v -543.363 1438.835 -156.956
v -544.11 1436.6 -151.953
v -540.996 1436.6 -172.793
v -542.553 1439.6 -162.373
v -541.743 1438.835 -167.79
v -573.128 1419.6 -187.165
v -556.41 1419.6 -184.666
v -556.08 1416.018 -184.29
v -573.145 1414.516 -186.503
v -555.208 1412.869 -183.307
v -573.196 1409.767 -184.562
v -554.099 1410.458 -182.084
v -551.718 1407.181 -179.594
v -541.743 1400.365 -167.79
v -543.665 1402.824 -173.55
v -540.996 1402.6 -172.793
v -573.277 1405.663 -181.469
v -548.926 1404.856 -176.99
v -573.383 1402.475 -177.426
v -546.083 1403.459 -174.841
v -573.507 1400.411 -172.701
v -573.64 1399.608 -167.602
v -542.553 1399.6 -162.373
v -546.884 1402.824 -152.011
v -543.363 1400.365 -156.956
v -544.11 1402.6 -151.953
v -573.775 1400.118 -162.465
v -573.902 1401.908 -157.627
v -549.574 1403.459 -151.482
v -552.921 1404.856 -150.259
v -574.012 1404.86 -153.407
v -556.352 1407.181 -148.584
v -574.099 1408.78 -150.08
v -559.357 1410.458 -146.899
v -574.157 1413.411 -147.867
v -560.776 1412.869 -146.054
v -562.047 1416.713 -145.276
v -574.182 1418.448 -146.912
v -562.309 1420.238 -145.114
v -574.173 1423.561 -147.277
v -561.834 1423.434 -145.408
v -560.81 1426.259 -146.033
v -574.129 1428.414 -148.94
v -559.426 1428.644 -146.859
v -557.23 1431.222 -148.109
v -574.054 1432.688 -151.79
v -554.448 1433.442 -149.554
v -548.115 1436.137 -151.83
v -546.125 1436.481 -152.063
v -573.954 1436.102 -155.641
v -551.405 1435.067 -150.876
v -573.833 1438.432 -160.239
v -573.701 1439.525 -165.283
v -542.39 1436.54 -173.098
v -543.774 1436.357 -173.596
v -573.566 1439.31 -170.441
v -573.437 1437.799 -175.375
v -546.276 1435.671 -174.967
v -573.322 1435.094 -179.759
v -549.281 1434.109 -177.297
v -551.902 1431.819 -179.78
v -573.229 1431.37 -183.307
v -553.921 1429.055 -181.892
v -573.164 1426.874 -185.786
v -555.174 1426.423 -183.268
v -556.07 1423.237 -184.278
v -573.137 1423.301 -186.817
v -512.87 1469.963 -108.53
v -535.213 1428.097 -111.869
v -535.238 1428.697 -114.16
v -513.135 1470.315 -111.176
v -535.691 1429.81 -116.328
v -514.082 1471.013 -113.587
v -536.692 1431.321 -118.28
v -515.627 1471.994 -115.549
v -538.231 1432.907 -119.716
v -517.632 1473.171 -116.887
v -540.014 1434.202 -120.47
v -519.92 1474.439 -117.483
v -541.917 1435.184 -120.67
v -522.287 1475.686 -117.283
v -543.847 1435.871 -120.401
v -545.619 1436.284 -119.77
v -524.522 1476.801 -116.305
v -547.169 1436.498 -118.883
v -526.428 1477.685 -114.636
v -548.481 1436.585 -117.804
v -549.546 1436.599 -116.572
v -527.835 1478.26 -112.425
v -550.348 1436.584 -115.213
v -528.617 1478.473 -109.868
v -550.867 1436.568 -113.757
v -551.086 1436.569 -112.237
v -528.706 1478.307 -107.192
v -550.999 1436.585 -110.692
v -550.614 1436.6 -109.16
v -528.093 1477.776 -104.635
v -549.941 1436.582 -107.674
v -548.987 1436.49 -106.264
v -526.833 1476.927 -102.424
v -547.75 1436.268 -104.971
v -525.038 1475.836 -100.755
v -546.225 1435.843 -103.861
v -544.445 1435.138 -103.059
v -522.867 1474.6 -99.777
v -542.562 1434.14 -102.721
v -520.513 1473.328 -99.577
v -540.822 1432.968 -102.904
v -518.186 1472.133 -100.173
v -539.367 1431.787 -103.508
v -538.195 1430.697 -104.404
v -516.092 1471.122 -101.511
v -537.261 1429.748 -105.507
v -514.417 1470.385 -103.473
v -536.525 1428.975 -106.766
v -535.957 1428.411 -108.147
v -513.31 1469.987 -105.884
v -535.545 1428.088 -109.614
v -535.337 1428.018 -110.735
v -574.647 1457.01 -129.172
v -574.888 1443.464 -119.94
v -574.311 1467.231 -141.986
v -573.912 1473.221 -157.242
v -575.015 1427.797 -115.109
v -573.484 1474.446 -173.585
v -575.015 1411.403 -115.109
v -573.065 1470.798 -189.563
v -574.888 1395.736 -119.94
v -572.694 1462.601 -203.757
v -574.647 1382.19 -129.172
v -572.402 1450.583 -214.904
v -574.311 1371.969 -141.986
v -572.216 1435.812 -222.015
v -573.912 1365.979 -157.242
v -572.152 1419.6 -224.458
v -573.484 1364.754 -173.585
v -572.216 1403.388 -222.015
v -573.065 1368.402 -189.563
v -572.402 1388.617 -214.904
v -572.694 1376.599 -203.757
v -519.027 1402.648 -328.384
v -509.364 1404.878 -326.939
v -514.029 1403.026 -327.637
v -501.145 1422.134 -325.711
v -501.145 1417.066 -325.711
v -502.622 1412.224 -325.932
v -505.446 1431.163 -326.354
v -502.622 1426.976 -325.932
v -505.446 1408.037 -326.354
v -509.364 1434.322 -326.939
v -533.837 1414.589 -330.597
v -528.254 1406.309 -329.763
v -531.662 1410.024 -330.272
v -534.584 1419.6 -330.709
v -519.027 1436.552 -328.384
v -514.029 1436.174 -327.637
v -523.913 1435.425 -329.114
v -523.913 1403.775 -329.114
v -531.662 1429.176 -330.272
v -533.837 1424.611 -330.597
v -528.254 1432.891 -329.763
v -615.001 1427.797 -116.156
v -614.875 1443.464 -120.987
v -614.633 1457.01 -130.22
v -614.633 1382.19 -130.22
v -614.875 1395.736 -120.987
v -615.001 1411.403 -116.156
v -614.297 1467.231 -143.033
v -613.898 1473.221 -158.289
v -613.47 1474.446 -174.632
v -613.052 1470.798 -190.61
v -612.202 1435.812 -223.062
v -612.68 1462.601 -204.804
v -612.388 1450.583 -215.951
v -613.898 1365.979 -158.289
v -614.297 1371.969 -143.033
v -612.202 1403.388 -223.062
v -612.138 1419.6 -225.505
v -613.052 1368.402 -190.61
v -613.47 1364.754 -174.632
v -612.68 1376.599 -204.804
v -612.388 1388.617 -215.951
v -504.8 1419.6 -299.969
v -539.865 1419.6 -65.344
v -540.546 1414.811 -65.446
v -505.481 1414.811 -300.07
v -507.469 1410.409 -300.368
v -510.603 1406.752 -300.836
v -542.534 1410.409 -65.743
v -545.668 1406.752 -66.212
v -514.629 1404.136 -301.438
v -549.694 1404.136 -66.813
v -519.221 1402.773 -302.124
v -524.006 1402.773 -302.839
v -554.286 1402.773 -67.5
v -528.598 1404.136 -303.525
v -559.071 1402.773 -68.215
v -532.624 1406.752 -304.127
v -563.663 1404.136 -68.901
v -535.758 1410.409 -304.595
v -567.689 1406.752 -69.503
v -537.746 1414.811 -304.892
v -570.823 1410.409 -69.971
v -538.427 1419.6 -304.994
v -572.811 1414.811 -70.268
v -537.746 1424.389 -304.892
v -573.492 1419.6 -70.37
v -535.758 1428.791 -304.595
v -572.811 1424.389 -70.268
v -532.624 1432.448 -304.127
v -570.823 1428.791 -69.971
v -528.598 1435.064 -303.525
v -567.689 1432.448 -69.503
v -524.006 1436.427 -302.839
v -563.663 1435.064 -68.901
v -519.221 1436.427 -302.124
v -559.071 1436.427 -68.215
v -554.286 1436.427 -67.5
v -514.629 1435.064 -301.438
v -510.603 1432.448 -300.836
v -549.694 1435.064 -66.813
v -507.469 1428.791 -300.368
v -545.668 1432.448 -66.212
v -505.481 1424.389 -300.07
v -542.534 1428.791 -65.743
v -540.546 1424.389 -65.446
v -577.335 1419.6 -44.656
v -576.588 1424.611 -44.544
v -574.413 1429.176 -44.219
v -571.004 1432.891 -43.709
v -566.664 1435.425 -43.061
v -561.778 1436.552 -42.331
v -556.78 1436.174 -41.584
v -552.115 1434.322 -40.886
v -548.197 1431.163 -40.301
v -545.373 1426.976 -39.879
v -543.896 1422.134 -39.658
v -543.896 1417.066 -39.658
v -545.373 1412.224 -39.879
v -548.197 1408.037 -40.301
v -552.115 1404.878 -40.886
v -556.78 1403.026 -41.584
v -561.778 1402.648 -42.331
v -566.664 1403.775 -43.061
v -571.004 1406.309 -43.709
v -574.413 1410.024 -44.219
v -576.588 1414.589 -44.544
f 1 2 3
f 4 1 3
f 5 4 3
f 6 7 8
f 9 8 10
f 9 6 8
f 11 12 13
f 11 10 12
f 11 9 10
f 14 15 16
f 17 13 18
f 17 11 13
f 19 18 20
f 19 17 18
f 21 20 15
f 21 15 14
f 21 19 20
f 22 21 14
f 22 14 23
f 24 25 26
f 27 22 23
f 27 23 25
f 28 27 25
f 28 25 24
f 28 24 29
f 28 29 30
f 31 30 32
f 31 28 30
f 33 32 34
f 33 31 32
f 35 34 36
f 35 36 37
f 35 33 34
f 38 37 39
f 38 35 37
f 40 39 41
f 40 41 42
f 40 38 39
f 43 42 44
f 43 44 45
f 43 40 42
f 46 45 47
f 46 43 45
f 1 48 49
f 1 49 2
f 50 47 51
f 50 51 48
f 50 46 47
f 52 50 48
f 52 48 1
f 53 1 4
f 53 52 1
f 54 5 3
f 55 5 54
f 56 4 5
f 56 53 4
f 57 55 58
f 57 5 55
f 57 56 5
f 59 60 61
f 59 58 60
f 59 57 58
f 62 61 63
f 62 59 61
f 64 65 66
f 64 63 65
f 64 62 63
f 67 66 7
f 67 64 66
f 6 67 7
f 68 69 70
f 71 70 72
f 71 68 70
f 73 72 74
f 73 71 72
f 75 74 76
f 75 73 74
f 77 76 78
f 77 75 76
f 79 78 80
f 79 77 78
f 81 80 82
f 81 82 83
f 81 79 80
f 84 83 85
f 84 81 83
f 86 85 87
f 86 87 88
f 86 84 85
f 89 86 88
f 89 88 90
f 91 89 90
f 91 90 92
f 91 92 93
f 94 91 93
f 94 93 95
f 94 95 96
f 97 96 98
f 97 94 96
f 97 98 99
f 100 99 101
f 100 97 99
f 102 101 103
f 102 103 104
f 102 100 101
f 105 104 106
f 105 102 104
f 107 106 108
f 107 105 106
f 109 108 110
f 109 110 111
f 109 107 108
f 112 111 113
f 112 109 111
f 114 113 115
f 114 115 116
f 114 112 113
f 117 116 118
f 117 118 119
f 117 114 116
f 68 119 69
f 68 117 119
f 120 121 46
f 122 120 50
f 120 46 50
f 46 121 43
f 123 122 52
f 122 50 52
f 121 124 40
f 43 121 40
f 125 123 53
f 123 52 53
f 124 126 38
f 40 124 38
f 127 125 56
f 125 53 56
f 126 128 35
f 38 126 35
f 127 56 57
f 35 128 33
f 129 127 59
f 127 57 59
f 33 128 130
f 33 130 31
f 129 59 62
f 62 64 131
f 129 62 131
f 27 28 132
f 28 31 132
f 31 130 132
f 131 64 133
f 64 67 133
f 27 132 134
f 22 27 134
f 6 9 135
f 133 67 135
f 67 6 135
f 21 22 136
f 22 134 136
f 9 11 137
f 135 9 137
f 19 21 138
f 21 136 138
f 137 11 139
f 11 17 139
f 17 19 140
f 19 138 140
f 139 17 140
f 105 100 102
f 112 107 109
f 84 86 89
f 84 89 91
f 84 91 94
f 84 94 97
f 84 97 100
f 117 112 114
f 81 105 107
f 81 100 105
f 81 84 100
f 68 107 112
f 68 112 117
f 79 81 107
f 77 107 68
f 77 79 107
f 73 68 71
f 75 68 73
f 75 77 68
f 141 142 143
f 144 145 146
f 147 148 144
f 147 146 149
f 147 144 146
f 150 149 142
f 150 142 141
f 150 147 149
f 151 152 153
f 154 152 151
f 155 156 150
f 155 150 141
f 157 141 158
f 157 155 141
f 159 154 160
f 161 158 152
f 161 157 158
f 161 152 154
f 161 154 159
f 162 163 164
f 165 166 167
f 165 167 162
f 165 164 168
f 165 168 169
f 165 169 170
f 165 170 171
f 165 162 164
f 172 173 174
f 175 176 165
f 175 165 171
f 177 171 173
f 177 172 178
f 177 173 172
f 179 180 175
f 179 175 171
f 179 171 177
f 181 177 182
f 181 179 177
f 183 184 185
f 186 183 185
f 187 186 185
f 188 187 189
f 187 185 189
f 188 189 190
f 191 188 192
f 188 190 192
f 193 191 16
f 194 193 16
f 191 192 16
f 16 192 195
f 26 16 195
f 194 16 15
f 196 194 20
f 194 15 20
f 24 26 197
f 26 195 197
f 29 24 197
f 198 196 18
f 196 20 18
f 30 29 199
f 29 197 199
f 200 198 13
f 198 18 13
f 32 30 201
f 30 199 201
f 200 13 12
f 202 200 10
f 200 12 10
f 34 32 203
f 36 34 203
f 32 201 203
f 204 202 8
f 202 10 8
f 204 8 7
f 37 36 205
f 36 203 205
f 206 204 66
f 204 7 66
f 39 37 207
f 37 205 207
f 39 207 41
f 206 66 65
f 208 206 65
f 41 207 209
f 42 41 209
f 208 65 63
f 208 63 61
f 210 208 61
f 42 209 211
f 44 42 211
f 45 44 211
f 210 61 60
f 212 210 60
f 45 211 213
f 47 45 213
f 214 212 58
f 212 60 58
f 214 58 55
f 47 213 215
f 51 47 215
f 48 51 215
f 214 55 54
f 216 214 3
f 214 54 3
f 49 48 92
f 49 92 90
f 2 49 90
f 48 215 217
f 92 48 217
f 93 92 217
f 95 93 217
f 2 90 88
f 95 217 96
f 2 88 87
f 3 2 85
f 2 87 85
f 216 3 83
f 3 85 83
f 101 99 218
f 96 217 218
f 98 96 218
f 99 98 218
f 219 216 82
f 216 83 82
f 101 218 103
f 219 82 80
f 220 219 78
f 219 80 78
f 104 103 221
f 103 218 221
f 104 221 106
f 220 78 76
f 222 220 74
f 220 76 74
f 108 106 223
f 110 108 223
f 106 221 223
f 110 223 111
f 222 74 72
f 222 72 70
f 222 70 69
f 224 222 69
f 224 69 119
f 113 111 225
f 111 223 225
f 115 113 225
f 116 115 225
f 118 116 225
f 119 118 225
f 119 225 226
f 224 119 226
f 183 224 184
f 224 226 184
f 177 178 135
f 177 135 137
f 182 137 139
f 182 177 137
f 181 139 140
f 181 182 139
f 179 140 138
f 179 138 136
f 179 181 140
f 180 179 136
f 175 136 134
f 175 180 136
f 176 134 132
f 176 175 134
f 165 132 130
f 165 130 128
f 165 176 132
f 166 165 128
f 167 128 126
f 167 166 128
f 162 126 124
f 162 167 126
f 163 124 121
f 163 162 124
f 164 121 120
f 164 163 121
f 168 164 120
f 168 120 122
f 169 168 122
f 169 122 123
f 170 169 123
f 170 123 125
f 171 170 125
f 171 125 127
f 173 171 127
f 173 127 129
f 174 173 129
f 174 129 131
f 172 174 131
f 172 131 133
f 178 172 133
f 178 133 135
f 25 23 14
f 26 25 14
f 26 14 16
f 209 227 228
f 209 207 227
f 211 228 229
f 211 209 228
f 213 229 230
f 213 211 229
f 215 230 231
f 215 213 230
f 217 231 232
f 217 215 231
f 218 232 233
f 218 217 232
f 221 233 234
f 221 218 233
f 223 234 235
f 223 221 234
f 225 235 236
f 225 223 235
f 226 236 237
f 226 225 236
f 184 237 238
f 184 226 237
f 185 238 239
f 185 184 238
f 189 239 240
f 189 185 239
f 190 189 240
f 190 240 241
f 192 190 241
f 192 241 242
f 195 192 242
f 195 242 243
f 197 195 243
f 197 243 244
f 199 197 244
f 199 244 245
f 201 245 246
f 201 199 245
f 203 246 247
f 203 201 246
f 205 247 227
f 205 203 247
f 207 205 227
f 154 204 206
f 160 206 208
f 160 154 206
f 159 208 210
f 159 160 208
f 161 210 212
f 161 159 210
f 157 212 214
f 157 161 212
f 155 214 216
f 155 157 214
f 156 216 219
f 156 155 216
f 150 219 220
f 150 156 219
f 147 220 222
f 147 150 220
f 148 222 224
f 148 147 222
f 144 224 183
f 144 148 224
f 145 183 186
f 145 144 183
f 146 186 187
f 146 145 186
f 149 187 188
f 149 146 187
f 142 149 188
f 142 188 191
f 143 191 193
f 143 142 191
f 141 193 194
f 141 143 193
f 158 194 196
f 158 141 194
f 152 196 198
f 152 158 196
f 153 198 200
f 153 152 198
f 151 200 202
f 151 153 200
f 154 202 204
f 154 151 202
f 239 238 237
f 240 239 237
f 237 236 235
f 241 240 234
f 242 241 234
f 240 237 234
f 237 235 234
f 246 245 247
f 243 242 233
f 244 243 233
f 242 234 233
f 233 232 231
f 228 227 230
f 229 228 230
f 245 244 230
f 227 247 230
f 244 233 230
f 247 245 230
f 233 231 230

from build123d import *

# Parameters (mm, degrees)
SUSP_RL_UCA_BALL_JOINT_PROFILE_R  = 17
SUSP_RL_LCA_BALL_JOINT_PROFILE_R  = 17
SUSP_RL_UPRIGHT_KINGPIN_START     = -15.170463608
SUSP_RL_UPRIGHT_KINGPIN_OUTLINE_R = 17
SUSP_RL_UPRIGHT_KINGPIN_DEPTH     = 237.229999131
SUSP_RL_UPRIGHT_SPINDLE_PROFILE_R = 20
SUSP_RL_UPRIGHT_ARM_PROFILE_R     = 9
SUSP_RL_HUB_PROFILE_R             = 55


# Read off the part's stored shape, not the designer's step: SUSP_RL_upright_kingpin
with BuildPart() as part:
    # SUSP_RL_UCA_ball_joint: sweep along a curve in space
    with BuildLine() as susp_rl_uca_ball_joint_path:
        Line((-521.613651, 1419.6, -302.481439), (-517.770606, 1419.6, -328.195852))
    # SUSP_RL_UCA_ball_joint profile (on start of the path) → SUSP_RL_UCA_ball_joint (sweep)
    with BuildSketch(Plane(origin=(-521.613651, 1419.6, -302.481439), x_dir=(-0.9890158620797268, 0, -0.14780941970894487), z_dir=(0.14780941970894487, 0, -0.9890158620797268))):
        Circle(SUSP_RL_UCA_BALL_JOINT_PROFILE_R)
    sweep(path=susp_rl_uca_ball_joint_path.line)


with BuildPart() as body_2:
    # SUSP_RL_LCA_ball_joint: sweep along a curve in space
    with BuildLine() as susp_rl_lca_ball_joint_path:
        Line((-560.521522, 1419.6, -42.1427938), (-556.678478, 1419.6, -67.8572062))
    # SUSP_RL_LCA_ball_joint profile (on start of the path) → SUSP_RL_LCA_ball_joint (sweep)
    with BuildSketch(Plane(origin=(-560.521522, 1419.6, -42.1427938), x_dir=(-0.9890158671980833, 0, -0.14780938546121916), z_dir=(0.14780938546121916, 0, -0.9890158671980833))):
        Circle(SUSP_RL_LCA_BALL_JOINT_PROFILE_R)
    sweep(path=susp_rl_lca_ball_joint_path.line)


with BuildPart() as susp_rl_upright_kingpin_tool:
    # SUSP_RL_upright_kingpin outline → SUSP_RL_upright_kingpin (new body)
    with BuildSketch(Plane(origin=(0, 0, 0), x_dir=(0.9890158635477251, 0, 0.14780940988633906), z_dir=(0.14780940988633903, 0, -0.9890158635477251)).offset(SUSP_RL_UPRIGHT_KINGPIN_START)):
        with Locations((-560.593778922, -1419.6)):
            Circle(SUSP_RL_UPRIGHT_KINGPIN_OUTLINE_R)
    extrude(amount=SUSP_RL_UPRIGHT_KINGPIN_DEPTH)


with BuildPart() as part_1:
    add(part.part)


with BuildPart() as part_2:
    # SUSP_RL_upright_kingpin: joined with susp_rl_upright_kingpin_tool
    add(part_1.part.fuse(susp_rl_upright_kingpin_tool.part, body_2.part, tol=0.00001))

    # SUSP_RL_upright_spindle: sweep along a curve in space
    with BuildLine() as susp_rl_upright_spindle_path:
        Line((-542.552954, 1419.6, -162.373292), (-593.584449, 1419.6, -170))
    # SUSP_RL_upright_spindle profile (on start of the path) → SUSP_RL_upright_spindle (sweep)
    with BuildSketch(Plane(origin=(-542.552954, 1419.6, -162.373292), x_dir=(0.14780941059704947, 0, -0.9890158634415087), z_dir=(-0.9890158634415087, 0, -0.14780941059704947))):
        Circle(SUSP_RL_UPRIGHT_SPINDLE_PROFILE_R)
    sweep(path=susp_rl_upright_spindle_path.line)

    # SUSP_RL_upright_arm: sweep along a curve in space
    with BuildLine() as susp_rl_upright_arm_path:
        Line((-549.94905, 1419.6, -112.88486), (-520.81, 1474.2, -108.53))
    # SUSP_RL_upright_arm profile (on start of the path) → SUSP_RL_upright_arm (sweep)
    with BuildSketch(Plane(origin=(-549.94905, 1419.6, -112.88486), x_dir=(0.8822250985406449, -0.47082786186137016, 0), z_dir=(0.46966656036901244, 0.8800490817699289, 0.07019213450982756))):
        Circle(SUSP_RL_UPRIGHT_ARM_PROFILE_R)
    sweep(path=susp_rl_upright_arm_path.line)

    # SUSP_RL_hub: sweep along a curve in space
    with BuildLine() as susp_rl_hub_path:
        Line((-573.591303, 1419.6, -169.476461), (-613.577596, 1419.6, -170.523539))
    # SUSP_RL_hub profile (on start of the path) → SUSP_RL_hub (sweep)
    with BuildSketch(Plane(origin=(-573.591303, 1419.6, -169.476461), x_dir=(0.026176949998200902, 0, -0.9996573249312944), z_dir=(-0.9996573249312944, 0, -0.026176949998200902))):
        Circle(SUSP_RL_HUB_PROFILE_R)
    sweep(path=susp_rl_hub_path.line)


solid = part_2.part
